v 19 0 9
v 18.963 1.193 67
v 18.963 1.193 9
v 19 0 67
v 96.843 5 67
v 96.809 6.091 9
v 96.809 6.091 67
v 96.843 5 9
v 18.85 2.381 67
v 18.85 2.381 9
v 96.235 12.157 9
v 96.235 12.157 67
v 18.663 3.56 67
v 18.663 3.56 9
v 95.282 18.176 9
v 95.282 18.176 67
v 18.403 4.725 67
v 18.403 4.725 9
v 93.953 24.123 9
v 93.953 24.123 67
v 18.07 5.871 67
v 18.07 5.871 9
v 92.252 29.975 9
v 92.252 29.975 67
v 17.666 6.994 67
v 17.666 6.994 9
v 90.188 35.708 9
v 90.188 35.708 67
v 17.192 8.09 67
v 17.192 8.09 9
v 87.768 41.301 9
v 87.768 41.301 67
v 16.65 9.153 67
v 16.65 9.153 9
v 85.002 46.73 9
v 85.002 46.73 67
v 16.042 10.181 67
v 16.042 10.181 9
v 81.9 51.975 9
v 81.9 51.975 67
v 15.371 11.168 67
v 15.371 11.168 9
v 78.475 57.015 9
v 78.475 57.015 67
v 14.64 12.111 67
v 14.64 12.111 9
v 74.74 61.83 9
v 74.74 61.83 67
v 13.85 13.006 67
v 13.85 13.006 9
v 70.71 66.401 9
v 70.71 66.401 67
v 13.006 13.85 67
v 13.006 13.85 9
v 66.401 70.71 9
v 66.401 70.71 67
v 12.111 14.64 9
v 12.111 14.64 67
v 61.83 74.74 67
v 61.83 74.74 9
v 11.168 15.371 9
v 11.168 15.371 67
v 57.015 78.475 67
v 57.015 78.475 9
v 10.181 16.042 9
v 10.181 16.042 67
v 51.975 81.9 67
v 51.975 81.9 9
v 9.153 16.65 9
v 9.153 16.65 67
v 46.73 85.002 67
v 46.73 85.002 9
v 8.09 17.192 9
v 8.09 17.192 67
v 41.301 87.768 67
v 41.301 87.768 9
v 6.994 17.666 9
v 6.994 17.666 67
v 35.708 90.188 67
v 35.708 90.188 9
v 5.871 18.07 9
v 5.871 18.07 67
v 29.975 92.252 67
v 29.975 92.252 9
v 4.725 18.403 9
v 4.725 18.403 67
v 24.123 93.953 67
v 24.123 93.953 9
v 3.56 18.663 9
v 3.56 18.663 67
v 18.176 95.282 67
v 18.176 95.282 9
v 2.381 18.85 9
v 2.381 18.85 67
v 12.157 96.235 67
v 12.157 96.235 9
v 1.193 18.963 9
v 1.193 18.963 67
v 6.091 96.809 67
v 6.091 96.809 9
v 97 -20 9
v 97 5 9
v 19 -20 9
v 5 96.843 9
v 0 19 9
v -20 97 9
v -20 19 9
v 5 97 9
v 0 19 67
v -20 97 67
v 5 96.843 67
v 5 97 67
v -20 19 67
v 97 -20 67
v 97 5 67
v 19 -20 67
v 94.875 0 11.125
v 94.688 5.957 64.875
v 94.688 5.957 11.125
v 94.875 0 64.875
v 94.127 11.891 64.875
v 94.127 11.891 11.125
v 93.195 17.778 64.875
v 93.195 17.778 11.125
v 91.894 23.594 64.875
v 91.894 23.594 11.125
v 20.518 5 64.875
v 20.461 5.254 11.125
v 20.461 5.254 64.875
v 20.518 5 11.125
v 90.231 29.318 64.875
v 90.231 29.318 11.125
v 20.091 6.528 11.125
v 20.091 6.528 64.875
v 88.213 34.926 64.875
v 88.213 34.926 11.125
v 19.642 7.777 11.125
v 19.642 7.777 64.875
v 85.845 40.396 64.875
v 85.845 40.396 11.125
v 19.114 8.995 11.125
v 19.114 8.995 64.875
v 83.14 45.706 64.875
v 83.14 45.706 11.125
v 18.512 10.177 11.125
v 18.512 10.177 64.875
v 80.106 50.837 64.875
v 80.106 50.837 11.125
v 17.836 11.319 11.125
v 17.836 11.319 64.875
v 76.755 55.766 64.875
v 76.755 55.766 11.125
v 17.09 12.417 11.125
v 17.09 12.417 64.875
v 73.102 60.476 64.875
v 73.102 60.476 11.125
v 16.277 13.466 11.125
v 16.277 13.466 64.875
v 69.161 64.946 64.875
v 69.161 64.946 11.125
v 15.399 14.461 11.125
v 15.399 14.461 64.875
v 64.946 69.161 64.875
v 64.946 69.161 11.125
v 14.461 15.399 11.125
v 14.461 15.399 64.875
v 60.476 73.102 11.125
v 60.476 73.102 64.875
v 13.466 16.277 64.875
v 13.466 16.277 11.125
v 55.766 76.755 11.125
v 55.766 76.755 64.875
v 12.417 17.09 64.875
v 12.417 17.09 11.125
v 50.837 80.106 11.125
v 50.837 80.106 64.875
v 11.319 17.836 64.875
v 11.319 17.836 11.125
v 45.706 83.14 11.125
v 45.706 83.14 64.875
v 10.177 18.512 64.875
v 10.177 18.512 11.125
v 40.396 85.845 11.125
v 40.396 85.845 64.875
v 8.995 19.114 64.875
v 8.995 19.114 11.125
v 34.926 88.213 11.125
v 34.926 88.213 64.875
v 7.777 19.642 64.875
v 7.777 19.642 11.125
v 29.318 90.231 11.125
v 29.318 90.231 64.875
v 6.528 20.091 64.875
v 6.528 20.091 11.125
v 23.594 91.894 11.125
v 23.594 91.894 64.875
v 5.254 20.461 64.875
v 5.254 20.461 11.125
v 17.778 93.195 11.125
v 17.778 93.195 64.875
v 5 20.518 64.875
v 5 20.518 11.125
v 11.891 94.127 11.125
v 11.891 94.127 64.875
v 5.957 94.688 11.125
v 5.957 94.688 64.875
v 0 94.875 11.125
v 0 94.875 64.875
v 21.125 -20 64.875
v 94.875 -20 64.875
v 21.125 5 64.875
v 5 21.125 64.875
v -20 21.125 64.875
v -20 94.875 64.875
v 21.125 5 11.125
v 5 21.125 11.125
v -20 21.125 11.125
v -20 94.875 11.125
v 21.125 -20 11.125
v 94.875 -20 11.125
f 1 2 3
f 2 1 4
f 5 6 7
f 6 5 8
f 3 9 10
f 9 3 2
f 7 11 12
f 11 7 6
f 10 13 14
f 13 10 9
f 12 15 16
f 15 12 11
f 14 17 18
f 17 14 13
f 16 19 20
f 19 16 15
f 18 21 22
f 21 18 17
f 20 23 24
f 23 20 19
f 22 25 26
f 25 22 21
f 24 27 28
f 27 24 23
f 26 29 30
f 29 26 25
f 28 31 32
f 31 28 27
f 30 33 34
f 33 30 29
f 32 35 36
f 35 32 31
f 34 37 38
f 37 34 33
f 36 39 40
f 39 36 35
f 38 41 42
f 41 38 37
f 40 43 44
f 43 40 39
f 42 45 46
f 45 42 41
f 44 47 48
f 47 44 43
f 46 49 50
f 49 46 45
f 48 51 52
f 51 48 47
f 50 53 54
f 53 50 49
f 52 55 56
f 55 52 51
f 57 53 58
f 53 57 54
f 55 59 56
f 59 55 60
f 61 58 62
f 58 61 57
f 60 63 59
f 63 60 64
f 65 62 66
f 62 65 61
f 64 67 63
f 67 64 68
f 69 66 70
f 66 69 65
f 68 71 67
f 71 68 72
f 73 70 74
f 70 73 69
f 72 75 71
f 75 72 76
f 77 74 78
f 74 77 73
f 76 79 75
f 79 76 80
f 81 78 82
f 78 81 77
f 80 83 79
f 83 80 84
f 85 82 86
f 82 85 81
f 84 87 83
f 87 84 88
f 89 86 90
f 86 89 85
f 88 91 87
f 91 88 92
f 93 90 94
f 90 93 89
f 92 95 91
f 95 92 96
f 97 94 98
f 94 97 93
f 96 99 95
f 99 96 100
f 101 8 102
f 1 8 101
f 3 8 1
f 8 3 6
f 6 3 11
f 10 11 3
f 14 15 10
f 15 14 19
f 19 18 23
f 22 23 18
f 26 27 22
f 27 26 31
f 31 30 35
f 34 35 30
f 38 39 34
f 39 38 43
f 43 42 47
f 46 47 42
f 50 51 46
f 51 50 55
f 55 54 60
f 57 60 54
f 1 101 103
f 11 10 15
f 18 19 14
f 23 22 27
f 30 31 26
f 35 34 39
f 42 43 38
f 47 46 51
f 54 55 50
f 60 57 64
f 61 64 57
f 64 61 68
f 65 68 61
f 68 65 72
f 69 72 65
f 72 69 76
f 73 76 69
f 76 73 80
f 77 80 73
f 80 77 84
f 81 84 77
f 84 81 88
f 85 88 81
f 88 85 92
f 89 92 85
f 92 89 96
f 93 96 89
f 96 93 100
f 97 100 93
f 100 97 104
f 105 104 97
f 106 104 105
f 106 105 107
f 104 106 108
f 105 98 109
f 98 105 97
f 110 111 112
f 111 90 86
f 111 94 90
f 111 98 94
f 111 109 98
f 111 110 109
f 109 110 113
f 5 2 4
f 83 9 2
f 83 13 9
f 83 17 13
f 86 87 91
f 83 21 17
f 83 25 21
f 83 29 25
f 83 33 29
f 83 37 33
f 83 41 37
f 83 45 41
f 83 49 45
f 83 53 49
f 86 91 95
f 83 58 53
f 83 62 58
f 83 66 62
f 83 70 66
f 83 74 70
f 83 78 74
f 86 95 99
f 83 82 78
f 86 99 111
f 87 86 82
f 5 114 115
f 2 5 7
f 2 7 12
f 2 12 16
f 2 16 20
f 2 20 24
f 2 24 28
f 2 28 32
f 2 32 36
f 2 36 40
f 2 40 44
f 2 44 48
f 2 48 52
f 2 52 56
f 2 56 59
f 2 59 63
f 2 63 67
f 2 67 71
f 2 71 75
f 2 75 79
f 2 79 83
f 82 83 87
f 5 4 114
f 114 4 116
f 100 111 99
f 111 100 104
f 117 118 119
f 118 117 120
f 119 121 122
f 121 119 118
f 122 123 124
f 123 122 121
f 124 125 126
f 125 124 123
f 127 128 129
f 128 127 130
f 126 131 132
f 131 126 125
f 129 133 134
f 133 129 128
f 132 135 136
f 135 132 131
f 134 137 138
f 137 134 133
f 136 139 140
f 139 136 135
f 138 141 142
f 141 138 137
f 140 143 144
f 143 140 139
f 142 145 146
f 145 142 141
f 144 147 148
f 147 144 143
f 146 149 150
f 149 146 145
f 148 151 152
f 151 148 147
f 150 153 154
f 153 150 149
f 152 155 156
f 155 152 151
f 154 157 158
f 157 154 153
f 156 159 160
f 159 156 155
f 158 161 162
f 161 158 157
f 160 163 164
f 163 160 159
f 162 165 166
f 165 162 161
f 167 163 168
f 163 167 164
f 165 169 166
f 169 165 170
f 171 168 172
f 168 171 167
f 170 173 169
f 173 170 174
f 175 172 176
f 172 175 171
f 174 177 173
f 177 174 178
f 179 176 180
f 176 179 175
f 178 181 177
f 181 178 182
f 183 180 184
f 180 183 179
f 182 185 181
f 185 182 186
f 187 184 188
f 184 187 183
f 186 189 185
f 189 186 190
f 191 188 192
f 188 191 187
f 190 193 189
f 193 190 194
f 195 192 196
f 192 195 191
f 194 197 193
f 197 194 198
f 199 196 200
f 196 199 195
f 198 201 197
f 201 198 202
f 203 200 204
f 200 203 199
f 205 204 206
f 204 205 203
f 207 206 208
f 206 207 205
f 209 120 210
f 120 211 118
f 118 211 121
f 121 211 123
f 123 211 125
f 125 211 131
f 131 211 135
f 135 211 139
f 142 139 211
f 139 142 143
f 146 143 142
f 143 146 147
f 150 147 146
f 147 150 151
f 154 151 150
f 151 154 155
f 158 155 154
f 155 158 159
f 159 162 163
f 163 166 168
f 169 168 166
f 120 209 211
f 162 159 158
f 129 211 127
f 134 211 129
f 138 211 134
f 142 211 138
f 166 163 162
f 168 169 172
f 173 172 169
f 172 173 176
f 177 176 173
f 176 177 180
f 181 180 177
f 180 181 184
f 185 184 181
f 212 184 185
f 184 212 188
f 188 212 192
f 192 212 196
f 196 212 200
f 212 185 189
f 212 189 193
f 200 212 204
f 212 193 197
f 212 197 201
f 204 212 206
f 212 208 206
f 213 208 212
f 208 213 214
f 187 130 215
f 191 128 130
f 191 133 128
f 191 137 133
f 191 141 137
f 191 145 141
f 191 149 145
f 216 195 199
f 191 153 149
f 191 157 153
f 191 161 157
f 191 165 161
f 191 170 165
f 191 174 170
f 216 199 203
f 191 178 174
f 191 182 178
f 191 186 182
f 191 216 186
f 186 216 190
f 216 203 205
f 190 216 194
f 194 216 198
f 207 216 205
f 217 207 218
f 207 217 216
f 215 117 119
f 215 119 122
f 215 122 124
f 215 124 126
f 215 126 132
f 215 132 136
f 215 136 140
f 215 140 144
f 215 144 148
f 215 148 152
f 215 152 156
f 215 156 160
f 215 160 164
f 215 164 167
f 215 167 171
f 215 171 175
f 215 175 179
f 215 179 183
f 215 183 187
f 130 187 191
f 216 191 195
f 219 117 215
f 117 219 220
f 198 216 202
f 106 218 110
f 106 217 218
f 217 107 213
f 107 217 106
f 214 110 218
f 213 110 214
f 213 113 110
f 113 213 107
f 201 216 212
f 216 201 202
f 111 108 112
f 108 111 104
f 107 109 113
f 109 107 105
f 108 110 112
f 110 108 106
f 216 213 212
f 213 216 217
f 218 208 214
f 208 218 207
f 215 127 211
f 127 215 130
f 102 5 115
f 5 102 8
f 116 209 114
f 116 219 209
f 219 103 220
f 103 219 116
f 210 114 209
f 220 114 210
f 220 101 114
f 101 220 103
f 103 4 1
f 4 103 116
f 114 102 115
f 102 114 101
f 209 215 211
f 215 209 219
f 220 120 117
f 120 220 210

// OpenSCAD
//rotate_extrude(angle=-90, convexity=10, $fn=100)
//rotate([90,0,0]) 
//translate([15,0,0]);
squareElbowTube(78,58,4.25,25);
//58,78,4.25,25

rotate([90,0,90]) 
translate([58,38,-20])
squareTube(78,58,4.25,25);

rotate([90,0,0]) 
translate([58,38,-5])
squareTube(78,58,4.25,25);

module squareElbowTube(outerwidth, outerheight, wallThickness, height)
{
        //linear_extrude(height,true)
    rotate_extrude(angle=90, convexity=10, $fn=100)
    translate([outerwidth-20, outerheight-20,0])
    difference()
    {
        square([outerwidth, outerheight],true);
        square([outerwidth-wallThickness,outerheight-wallThickness],true);
    }
}

module squareTube(outerwidth, outerheight, wallThickness, height)
{
        linear_extrude(height,true)
    difference()
    {
        square([outerwidth, outerheight],true);
        square([outerwidth-wallThickness,outerheight-wallThickness],true);
    }
}
